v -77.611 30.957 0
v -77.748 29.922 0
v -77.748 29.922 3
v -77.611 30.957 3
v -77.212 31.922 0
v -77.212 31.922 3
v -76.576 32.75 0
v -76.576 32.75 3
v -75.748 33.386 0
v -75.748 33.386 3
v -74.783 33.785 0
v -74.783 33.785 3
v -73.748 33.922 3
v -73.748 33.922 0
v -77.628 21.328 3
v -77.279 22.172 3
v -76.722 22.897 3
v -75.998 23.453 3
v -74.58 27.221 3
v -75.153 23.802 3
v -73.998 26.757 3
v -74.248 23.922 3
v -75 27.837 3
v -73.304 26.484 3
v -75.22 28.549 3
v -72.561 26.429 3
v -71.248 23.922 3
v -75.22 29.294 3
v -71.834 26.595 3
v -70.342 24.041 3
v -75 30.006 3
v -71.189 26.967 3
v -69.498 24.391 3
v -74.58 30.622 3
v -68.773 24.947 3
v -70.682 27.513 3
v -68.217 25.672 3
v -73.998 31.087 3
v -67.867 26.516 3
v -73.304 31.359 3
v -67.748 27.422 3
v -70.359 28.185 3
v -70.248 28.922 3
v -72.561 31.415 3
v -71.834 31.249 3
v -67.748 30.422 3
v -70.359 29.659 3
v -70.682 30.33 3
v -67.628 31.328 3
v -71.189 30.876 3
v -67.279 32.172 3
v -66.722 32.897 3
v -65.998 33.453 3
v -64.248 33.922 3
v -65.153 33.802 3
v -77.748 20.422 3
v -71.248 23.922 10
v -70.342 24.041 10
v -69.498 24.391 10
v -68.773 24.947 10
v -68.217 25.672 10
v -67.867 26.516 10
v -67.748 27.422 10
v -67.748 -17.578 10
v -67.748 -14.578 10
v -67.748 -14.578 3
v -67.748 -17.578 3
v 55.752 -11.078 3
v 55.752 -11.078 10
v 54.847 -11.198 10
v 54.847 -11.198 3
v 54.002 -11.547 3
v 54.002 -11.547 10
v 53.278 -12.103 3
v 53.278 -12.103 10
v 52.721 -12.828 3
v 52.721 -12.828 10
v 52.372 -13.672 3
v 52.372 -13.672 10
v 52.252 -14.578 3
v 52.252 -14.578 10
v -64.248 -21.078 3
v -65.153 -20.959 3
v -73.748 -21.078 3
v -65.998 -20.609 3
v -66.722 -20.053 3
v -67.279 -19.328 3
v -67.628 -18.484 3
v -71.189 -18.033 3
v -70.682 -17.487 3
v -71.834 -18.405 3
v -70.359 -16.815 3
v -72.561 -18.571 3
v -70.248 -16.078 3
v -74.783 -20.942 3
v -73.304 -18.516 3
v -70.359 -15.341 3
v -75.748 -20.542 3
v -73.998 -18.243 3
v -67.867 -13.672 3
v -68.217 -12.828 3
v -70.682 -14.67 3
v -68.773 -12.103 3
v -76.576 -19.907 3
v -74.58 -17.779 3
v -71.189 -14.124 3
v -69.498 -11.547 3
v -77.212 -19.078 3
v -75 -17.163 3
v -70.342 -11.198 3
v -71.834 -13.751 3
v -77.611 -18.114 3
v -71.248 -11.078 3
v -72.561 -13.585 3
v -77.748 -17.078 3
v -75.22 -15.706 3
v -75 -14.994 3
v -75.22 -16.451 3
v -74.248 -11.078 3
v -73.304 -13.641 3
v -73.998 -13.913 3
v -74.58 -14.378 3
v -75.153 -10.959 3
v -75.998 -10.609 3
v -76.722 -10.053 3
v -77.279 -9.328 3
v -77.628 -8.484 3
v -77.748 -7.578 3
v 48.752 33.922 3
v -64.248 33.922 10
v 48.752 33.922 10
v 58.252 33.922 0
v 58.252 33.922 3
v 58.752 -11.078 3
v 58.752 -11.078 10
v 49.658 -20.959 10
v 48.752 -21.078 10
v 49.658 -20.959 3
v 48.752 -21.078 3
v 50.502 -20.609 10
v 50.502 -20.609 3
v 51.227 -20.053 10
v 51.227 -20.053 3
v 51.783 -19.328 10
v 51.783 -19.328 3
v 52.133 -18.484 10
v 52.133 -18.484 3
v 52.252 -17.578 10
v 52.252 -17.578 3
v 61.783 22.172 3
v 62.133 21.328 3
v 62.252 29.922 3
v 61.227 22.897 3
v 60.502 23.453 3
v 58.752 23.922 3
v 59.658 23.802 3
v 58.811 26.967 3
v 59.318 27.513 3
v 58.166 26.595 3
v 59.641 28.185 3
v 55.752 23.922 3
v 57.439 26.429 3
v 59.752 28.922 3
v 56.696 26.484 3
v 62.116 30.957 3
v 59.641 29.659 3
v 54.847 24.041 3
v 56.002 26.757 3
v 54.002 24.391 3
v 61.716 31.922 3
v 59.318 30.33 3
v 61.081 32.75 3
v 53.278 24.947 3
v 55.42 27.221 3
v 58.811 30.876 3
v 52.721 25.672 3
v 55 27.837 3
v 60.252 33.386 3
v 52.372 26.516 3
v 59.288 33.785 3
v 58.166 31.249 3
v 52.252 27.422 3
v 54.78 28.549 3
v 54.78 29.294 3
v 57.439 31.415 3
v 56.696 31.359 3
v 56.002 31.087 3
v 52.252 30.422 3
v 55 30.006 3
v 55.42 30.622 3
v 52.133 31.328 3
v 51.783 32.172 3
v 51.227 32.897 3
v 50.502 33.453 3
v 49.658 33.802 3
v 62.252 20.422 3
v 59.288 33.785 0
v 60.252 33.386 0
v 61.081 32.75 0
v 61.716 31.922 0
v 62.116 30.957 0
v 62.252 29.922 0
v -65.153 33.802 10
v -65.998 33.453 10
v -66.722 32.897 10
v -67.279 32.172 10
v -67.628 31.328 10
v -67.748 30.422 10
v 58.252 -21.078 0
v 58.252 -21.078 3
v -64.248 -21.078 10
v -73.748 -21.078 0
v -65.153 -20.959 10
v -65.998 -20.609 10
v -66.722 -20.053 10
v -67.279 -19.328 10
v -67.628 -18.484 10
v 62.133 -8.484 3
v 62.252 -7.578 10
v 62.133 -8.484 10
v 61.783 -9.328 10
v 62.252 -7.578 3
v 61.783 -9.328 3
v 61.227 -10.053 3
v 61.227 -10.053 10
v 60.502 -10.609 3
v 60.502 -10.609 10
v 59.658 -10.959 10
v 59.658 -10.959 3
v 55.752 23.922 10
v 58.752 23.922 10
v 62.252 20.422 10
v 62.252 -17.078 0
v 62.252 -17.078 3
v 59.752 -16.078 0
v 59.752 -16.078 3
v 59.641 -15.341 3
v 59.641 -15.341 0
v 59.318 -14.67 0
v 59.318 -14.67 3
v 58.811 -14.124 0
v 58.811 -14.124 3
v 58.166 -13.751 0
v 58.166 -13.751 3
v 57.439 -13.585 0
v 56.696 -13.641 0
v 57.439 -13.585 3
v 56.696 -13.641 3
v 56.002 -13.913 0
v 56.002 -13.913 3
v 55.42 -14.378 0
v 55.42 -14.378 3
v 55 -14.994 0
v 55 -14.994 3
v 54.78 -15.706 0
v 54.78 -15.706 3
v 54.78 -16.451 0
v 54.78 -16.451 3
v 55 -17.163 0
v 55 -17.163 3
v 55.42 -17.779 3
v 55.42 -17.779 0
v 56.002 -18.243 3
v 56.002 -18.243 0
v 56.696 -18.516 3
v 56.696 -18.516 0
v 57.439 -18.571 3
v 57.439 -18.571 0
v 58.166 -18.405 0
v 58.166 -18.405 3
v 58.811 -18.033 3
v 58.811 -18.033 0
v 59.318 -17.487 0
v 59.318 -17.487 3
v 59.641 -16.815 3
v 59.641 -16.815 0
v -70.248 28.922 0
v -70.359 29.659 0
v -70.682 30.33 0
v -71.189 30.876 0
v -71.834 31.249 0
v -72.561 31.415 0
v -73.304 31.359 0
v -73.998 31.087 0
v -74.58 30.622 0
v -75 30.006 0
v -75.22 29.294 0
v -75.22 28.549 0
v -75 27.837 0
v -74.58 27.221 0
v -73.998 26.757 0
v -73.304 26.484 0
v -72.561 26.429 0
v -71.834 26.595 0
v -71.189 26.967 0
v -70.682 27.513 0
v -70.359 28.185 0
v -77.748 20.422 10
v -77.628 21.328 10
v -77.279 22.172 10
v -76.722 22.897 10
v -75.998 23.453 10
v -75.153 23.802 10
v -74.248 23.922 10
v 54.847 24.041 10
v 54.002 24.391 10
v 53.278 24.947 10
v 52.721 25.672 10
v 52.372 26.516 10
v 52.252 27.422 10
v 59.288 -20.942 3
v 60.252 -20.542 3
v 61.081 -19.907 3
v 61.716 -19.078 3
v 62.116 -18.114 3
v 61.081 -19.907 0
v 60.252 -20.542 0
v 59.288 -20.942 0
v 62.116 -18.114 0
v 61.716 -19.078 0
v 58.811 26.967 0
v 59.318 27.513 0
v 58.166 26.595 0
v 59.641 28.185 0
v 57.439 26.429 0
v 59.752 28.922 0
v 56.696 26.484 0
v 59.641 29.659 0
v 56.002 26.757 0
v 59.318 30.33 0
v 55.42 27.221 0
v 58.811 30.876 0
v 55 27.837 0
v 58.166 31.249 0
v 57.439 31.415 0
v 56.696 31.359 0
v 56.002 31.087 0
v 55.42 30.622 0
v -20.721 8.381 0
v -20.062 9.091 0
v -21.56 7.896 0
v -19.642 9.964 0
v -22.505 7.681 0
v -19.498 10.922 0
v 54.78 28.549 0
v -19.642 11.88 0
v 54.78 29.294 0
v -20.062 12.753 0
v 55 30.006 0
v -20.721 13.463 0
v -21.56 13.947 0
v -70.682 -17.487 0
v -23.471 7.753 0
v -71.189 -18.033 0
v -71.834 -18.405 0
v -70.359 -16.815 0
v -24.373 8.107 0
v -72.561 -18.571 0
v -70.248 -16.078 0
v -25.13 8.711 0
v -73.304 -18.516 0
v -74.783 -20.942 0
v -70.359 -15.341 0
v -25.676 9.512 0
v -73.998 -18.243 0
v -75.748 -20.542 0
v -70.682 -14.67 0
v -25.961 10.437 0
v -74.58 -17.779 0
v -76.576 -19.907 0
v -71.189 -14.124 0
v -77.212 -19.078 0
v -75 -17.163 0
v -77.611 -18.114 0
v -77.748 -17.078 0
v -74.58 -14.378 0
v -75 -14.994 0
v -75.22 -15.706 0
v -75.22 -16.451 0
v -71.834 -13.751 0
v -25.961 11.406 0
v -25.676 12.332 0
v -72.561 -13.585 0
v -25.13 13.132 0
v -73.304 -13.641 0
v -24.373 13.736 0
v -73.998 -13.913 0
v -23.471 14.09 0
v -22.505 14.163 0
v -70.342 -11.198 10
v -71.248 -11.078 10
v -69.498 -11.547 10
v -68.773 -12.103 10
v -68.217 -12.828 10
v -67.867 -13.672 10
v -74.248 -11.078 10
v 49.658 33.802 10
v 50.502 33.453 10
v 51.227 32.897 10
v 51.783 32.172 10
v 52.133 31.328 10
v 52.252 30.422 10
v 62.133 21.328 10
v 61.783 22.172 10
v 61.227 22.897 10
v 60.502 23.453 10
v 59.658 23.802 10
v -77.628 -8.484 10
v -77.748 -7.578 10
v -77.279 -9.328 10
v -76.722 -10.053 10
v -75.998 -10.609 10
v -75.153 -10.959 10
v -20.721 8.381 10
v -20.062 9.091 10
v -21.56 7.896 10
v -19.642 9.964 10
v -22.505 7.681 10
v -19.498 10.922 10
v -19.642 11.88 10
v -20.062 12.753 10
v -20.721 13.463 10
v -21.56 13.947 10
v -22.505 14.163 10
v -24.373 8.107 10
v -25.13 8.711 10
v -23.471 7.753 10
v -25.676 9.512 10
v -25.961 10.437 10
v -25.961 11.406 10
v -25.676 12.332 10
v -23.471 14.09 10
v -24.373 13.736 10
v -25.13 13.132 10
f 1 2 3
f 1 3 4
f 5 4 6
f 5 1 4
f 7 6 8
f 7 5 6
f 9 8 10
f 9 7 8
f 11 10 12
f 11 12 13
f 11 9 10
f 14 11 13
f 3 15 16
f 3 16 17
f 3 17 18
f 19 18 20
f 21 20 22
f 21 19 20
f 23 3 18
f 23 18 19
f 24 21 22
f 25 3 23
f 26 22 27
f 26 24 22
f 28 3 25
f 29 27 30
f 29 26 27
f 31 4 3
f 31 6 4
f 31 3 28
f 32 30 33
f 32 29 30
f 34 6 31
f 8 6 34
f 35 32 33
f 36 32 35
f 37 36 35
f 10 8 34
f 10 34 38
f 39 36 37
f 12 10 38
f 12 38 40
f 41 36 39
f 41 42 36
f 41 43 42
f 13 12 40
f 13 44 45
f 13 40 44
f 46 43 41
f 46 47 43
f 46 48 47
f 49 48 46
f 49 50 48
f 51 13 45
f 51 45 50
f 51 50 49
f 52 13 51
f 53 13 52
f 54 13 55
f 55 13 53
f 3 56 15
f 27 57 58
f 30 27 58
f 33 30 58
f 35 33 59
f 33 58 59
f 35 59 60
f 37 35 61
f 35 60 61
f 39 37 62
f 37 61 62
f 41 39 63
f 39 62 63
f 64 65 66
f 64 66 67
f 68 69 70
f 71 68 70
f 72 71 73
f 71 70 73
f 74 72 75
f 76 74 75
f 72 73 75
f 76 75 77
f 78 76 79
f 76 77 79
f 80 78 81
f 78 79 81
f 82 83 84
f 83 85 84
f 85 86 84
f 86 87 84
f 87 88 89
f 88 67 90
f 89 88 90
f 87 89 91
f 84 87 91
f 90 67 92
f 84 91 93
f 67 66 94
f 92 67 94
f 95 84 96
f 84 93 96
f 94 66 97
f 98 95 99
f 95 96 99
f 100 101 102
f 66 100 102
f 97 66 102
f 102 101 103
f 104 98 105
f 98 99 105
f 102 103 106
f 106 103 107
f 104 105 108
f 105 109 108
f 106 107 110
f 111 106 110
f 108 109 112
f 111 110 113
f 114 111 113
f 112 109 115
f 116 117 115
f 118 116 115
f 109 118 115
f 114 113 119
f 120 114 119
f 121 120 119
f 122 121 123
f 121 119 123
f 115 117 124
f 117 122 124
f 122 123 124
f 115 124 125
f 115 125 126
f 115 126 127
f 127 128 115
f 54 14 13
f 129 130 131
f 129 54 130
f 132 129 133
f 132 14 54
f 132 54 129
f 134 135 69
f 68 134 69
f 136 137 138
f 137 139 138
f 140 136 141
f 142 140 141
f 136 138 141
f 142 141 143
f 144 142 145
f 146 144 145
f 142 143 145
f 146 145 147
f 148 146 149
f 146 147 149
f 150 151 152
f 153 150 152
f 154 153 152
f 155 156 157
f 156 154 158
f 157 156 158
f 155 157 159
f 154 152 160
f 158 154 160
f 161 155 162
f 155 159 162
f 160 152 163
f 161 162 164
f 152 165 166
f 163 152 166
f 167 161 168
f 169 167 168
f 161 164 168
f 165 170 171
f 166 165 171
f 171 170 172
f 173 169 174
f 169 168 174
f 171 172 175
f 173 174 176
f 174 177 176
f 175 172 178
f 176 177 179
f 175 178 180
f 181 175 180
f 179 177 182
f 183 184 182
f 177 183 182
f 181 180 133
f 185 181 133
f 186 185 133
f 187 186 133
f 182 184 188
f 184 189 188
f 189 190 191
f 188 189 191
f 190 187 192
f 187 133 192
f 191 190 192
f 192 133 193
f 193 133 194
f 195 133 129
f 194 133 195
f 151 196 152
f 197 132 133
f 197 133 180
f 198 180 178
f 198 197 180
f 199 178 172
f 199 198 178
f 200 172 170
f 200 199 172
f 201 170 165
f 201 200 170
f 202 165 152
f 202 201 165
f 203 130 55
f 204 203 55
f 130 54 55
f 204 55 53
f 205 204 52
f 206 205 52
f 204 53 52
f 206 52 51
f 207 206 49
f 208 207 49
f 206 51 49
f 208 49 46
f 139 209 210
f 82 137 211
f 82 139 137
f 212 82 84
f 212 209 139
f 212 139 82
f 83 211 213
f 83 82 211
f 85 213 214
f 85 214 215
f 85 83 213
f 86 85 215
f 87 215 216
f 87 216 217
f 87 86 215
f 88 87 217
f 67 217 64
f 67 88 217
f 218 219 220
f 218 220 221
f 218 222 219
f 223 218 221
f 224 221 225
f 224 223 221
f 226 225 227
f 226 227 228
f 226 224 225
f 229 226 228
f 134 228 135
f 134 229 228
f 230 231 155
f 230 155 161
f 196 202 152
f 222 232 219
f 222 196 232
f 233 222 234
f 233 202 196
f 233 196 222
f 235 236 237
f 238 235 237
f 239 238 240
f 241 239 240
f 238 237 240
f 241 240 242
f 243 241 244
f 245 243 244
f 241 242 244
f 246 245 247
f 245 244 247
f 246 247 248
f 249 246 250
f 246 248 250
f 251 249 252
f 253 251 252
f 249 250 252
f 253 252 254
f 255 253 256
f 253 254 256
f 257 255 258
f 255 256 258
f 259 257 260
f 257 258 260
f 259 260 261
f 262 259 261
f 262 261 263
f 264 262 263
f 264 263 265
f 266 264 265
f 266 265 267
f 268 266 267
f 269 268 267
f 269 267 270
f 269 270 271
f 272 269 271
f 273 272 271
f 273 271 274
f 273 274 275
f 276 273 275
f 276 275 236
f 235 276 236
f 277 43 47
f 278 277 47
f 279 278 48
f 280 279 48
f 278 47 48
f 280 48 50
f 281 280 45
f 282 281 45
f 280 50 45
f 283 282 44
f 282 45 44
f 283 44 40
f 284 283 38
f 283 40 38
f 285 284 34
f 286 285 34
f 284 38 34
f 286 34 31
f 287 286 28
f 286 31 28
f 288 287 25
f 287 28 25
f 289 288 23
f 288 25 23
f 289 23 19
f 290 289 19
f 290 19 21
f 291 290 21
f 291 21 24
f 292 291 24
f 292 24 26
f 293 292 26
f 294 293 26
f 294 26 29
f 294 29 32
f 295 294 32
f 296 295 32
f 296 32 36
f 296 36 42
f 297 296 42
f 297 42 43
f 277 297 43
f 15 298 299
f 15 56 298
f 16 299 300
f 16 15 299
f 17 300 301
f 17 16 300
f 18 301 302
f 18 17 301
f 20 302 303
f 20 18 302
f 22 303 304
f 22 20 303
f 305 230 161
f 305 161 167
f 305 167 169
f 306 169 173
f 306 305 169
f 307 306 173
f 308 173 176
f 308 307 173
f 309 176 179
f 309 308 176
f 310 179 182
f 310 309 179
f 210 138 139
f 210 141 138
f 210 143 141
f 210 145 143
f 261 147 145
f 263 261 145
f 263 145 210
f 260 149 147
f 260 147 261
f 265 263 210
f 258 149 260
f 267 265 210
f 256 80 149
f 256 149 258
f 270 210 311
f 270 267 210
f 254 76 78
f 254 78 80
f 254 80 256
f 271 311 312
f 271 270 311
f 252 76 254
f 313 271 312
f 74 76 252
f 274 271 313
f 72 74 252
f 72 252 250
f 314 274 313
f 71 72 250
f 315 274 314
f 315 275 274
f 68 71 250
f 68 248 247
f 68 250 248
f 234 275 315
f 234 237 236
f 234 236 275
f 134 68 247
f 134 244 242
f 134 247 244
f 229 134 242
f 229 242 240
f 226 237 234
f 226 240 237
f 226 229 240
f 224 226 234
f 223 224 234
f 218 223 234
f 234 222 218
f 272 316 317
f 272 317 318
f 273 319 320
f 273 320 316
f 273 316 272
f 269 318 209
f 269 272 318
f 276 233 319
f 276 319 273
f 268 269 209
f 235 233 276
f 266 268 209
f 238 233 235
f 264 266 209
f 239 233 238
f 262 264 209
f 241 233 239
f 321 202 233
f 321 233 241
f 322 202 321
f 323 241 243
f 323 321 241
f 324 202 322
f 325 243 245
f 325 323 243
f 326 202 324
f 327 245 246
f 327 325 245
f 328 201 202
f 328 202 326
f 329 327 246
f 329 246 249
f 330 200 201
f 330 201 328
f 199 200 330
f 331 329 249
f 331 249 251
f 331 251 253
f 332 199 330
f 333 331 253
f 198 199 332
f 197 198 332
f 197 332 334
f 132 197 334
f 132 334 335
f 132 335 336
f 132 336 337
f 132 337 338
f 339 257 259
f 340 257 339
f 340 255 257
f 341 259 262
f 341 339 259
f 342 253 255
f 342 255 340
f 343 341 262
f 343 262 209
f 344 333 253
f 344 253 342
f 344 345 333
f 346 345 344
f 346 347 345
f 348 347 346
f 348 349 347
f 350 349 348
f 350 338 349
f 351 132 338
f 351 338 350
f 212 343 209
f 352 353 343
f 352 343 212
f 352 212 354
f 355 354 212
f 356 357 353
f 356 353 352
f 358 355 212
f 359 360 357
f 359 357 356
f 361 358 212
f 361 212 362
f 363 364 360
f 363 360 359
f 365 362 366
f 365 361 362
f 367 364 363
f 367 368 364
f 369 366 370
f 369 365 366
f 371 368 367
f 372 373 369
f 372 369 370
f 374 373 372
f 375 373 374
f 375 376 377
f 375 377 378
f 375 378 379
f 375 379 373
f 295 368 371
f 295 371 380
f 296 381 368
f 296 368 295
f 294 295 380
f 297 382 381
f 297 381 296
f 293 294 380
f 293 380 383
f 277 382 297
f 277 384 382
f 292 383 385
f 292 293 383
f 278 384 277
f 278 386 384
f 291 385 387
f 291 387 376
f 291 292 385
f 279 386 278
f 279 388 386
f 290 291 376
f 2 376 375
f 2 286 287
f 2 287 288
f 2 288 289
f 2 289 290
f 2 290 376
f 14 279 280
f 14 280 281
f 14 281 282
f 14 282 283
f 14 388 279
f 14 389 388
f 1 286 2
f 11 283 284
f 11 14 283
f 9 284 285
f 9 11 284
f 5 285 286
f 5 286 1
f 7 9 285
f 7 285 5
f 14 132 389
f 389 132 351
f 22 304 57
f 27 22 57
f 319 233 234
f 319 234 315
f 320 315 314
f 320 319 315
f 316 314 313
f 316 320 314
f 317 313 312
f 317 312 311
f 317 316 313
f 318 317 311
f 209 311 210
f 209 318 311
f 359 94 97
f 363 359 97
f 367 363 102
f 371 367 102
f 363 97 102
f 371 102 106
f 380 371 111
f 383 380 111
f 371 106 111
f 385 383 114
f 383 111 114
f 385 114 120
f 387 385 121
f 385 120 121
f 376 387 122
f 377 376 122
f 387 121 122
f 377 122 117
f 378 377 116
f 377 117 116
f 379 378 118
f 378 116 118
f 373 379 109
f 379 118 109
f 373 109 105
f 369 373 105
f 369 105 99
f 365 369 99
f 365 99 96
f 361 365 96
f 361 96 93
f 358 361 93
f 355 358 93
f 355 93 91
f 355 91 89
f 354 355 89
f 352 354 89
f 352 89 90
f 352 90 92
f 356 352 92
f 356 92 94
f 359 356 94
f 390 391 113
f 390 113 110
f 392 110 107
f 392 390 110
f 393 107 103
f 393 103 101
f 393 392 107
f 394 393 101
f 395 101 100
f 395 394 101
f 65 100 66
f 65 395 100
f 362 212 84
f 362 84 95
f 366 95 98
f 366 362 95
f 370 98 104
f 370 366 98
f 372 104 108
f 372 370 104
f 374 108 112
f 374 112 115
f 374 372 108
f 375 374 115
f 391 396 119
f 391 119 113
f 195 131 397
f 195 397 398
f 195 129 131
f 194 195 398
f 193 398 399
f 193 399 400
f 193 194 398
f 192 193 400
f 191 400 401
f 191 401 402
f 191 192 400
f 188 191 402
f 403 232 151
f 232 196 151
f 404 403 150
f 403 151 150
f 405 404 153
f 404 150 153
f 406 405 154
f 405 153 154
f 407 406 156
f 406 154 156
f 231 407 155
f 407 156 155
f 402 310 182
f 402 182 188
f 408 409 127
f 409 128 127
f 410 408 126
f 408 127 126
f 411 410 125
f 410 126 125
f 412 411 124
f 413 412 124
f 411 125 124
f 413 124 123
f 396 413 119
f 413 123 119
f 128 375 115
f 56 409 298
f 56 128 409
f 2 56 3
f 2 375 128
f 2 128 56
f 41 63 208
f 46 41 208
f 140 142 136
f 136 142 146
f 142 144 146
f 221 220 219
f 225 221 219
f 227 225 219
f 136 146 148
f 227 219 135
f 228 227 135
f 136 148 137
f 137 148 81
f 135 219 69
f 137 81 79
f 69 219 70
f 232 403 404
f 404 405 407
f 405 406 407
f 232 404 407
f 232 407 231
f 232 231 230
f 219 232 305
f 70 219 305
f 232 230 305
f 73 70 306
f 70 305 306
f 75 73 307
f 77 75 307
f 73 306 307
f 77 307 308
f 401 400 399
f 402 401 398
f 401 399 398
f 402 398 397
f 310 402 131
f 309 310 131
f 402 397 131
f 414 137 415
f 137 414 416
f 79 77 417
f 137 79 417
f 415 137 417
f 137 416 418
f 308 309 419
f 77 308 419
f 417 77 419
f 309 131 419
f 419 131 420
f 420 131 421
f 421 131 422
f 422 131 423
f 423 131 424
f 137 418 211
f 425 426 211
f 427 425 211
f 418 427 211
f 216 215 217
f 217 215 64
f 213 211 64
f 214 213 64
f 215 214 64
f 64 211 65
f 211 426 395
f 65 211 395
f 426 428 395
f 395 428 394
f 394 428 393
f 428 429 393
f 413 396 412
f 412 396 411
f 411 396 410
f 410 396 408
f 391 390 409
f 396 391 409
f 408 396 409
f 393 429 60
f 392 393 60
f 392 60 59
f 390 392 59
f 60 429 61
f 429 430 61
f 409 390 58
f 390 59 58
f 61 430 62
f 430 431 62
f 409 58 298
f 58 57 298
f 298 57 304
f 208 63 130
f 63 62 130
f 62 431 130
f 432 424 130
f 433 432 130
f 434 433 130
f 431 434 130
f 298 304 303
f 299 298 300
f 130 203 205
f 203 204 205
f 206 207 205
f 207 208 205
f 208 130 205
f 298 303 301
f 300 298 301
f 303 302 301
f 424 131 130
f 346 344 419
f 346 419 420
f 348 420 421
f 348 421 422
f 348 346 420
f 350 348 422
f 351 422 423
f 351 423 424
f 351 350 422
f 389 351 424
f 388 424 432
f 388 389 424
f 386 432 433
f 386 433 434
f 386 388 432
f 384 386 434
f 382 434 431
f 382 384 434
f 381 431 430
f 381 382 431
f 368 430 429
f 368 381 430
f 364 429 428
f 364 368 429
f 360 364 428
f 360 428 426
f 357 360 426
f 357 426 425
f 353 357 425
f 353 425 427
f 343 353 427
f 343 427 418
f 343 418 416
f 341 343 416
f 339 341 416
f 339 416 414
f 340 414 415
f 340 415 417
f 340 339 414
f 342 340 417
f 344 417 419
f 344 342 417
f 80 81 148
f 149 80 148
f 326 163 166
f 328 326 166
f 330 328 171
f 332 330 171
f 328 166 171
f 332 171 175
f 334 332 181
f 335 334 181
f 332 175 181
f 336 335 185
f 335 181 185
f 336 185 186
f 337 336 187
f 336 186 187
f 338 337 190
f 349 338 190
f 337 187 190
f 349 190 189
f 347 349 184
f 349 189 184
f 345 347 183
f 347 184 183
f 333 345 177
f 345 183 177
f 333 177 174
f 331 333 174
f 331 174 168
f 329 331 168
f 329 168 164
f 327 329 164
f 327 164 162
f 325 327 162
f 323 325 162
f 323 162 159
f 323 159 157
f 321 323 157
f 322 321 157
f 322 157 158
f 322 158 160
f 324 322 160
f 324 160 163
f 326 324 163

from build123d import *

# Parameters (mm, degrees)
SKETCH1_R           = 3.25
BOSS_EXTRUDE1_DEPTH = 10
CUT_EXTRUDE1_DEPTH  = 7
SKETCH3_R           = 2.5
CUT_EXTRUDE2_DEPTH  = 10
FILLET1_R           = 3.5


with BuildPart() as part:
    # Sketch1 → Boss-Extrude1 (new body)
    with BuildSketch(Plane.XY):
        with BuildLine():
            Line((-73.747603834, 33.92172524), (58.252396166, 33.92172524))
            ThreePointArc((58.252396166, 33.92172524), (61.080823291, 32.750152364), (62.252396166, 29.92172524))
            Line((62.252396166, 29.92172524), (62.252396166, -17.07827476))
            ThreePointArc((62.252396166, -17.07827476), (61.080823291, -19.906701885), (58.252396166, -21.07827476))
            Line((58.252396166, -21.07827476), (-73.747603834, -21.07827476))
            ThreePointArc((-73.747603834, -21.07827476), (-76.576030959, -19.906701885), (-77.747603834, -17.07827476))
            Line((-77.747603834, -17.07827476), (-77.747603834, 29.92172524))
            ThreePointArc((-77.747603834, 29.92172524), (-76.576030959, 32.750152364), (-73.747603834, 33.92172524))
        make_face()
        with Locations((-22.747603834, 10.92172524)):
            Circle(SKETCH1_R, mode=Mode.SUBTRACT)
    extrude(amount=BOSS_EXTRUDE1_DEPTH)

    # Sketch2 → Cut-Extrude1 (cut)
    with BuildSketch(Plane.XY.offset(10)):
        with BuildLine():
            Line((-77.747603834, 23.92172524), (-71.247603834, 23.92172524))
            ThreePointArc((-71.247603834, 23.92172524), (-68.7727301, 24.946851505), (-67.747603834, 27.42172524))
            Line((-67.747603834, 27.42172524), (-67.747603834, 33.92172524))
            Line((-67.747603834, 33.92172524), (-77.747603834, 33.92172524))
            Line((-77.747603834, 33.92172524), (-77.747603834, 23.92172524))
        make_face()
        with BuildLine():
            Line((-77.747603834, -11.07827476), (-71.247603834, -11.07827476))
            ThreePointArc((-71.247603834, -11.07827476), (-68.7727301, -12.103401026), (-67.747603834, -14.57827476))
            Line((-67.747603834, -14.57827476), (-67.747603834, -21.07827476))
            Line((-67.747603834, -21.07827476), (-77.747603834, -21.07827476))
            Line((-77.747603834, -21.07827476), (-77.747603834, -11.07827476))
        make_face()
        with BuildLine():
            Line((52.252396166, -21.07827476), (62.252396166, -21.07827476))
            Line((62.252396166, -21.07827476), (62.252396166, -11.07827476))
            Line((62.252396166, -11.07827476), (55.752396166, -11.07827476))
            ThreePointArc((55.752396166, -11.07827476), (53.277522432, -12.103401026), (52.252396166, -14.57827476))
            Line((52.252396166, -14.57827476), (52.252396166, -21.07827476))
        make_face()
        with BuildLine():
            Line((62.252396166, 23.92172524), (55.752396166, 23.92172524))
            ThreePointArc((55.752396166, 23.92172524), (53.277522432, 24.946851505), (52.252396166, 27.42172524))
            Line((52.252396166, 27.42172524), (52.252396166, 33.92172524))
            Line((52.252396166, 33.92172524), (62.252396166, 33.92172524))
            Line((62.252396166, 33.92172524), (62.252396166, 23.92172524))
        make_face()
    extrude(amount=-CUT_EXTRUDE1_DEPTH, mode=Mode.SUBTRACT)

    # Sketch3 → Cut-Extrude2 (cut)
    with BuildSketch(Plane.XY.offset(3)):
        with Locations((-72.747603834, 28.92172524)):
            Circle(SKETCH3_R)
        with Locations((57.252396166, 28.92172524)):
            Circle(SKETCH3_R)
        with Locations((57.252396166, -16.07827476)):
            Circle(SKETCH3_R)
        with Locations((-72.747603834, -16.07827476)):
            Circle(SKETCH3_R)
    extrude(amount=-CUT_EXTRUDE2_DEPTH, mode=Mode.SUBTRACT)

    # Fillet1
    fillet1_edges = [part.edges().sort_by_distance(p)[0] for p in [
        (52.252396166, 33.92172524, 6.5),
        (62.252396166, 23.92172524, 6.5),
        (62.252396166, -11.07827476, 6.5),
        (52.252396166, -21.07827476, 6.5),
        (-67.747603834, -21.07827476, 6.5),
        (-77.747603834, -11.07827476, 6.5),
        (-77.747603834, 23.92172524, 6.5),
        (-67.747603834, 33.92172524, 6.5),
    ]]
    fillet(fillet1_edges, radius=FILLET1_R)


solid = part.part
